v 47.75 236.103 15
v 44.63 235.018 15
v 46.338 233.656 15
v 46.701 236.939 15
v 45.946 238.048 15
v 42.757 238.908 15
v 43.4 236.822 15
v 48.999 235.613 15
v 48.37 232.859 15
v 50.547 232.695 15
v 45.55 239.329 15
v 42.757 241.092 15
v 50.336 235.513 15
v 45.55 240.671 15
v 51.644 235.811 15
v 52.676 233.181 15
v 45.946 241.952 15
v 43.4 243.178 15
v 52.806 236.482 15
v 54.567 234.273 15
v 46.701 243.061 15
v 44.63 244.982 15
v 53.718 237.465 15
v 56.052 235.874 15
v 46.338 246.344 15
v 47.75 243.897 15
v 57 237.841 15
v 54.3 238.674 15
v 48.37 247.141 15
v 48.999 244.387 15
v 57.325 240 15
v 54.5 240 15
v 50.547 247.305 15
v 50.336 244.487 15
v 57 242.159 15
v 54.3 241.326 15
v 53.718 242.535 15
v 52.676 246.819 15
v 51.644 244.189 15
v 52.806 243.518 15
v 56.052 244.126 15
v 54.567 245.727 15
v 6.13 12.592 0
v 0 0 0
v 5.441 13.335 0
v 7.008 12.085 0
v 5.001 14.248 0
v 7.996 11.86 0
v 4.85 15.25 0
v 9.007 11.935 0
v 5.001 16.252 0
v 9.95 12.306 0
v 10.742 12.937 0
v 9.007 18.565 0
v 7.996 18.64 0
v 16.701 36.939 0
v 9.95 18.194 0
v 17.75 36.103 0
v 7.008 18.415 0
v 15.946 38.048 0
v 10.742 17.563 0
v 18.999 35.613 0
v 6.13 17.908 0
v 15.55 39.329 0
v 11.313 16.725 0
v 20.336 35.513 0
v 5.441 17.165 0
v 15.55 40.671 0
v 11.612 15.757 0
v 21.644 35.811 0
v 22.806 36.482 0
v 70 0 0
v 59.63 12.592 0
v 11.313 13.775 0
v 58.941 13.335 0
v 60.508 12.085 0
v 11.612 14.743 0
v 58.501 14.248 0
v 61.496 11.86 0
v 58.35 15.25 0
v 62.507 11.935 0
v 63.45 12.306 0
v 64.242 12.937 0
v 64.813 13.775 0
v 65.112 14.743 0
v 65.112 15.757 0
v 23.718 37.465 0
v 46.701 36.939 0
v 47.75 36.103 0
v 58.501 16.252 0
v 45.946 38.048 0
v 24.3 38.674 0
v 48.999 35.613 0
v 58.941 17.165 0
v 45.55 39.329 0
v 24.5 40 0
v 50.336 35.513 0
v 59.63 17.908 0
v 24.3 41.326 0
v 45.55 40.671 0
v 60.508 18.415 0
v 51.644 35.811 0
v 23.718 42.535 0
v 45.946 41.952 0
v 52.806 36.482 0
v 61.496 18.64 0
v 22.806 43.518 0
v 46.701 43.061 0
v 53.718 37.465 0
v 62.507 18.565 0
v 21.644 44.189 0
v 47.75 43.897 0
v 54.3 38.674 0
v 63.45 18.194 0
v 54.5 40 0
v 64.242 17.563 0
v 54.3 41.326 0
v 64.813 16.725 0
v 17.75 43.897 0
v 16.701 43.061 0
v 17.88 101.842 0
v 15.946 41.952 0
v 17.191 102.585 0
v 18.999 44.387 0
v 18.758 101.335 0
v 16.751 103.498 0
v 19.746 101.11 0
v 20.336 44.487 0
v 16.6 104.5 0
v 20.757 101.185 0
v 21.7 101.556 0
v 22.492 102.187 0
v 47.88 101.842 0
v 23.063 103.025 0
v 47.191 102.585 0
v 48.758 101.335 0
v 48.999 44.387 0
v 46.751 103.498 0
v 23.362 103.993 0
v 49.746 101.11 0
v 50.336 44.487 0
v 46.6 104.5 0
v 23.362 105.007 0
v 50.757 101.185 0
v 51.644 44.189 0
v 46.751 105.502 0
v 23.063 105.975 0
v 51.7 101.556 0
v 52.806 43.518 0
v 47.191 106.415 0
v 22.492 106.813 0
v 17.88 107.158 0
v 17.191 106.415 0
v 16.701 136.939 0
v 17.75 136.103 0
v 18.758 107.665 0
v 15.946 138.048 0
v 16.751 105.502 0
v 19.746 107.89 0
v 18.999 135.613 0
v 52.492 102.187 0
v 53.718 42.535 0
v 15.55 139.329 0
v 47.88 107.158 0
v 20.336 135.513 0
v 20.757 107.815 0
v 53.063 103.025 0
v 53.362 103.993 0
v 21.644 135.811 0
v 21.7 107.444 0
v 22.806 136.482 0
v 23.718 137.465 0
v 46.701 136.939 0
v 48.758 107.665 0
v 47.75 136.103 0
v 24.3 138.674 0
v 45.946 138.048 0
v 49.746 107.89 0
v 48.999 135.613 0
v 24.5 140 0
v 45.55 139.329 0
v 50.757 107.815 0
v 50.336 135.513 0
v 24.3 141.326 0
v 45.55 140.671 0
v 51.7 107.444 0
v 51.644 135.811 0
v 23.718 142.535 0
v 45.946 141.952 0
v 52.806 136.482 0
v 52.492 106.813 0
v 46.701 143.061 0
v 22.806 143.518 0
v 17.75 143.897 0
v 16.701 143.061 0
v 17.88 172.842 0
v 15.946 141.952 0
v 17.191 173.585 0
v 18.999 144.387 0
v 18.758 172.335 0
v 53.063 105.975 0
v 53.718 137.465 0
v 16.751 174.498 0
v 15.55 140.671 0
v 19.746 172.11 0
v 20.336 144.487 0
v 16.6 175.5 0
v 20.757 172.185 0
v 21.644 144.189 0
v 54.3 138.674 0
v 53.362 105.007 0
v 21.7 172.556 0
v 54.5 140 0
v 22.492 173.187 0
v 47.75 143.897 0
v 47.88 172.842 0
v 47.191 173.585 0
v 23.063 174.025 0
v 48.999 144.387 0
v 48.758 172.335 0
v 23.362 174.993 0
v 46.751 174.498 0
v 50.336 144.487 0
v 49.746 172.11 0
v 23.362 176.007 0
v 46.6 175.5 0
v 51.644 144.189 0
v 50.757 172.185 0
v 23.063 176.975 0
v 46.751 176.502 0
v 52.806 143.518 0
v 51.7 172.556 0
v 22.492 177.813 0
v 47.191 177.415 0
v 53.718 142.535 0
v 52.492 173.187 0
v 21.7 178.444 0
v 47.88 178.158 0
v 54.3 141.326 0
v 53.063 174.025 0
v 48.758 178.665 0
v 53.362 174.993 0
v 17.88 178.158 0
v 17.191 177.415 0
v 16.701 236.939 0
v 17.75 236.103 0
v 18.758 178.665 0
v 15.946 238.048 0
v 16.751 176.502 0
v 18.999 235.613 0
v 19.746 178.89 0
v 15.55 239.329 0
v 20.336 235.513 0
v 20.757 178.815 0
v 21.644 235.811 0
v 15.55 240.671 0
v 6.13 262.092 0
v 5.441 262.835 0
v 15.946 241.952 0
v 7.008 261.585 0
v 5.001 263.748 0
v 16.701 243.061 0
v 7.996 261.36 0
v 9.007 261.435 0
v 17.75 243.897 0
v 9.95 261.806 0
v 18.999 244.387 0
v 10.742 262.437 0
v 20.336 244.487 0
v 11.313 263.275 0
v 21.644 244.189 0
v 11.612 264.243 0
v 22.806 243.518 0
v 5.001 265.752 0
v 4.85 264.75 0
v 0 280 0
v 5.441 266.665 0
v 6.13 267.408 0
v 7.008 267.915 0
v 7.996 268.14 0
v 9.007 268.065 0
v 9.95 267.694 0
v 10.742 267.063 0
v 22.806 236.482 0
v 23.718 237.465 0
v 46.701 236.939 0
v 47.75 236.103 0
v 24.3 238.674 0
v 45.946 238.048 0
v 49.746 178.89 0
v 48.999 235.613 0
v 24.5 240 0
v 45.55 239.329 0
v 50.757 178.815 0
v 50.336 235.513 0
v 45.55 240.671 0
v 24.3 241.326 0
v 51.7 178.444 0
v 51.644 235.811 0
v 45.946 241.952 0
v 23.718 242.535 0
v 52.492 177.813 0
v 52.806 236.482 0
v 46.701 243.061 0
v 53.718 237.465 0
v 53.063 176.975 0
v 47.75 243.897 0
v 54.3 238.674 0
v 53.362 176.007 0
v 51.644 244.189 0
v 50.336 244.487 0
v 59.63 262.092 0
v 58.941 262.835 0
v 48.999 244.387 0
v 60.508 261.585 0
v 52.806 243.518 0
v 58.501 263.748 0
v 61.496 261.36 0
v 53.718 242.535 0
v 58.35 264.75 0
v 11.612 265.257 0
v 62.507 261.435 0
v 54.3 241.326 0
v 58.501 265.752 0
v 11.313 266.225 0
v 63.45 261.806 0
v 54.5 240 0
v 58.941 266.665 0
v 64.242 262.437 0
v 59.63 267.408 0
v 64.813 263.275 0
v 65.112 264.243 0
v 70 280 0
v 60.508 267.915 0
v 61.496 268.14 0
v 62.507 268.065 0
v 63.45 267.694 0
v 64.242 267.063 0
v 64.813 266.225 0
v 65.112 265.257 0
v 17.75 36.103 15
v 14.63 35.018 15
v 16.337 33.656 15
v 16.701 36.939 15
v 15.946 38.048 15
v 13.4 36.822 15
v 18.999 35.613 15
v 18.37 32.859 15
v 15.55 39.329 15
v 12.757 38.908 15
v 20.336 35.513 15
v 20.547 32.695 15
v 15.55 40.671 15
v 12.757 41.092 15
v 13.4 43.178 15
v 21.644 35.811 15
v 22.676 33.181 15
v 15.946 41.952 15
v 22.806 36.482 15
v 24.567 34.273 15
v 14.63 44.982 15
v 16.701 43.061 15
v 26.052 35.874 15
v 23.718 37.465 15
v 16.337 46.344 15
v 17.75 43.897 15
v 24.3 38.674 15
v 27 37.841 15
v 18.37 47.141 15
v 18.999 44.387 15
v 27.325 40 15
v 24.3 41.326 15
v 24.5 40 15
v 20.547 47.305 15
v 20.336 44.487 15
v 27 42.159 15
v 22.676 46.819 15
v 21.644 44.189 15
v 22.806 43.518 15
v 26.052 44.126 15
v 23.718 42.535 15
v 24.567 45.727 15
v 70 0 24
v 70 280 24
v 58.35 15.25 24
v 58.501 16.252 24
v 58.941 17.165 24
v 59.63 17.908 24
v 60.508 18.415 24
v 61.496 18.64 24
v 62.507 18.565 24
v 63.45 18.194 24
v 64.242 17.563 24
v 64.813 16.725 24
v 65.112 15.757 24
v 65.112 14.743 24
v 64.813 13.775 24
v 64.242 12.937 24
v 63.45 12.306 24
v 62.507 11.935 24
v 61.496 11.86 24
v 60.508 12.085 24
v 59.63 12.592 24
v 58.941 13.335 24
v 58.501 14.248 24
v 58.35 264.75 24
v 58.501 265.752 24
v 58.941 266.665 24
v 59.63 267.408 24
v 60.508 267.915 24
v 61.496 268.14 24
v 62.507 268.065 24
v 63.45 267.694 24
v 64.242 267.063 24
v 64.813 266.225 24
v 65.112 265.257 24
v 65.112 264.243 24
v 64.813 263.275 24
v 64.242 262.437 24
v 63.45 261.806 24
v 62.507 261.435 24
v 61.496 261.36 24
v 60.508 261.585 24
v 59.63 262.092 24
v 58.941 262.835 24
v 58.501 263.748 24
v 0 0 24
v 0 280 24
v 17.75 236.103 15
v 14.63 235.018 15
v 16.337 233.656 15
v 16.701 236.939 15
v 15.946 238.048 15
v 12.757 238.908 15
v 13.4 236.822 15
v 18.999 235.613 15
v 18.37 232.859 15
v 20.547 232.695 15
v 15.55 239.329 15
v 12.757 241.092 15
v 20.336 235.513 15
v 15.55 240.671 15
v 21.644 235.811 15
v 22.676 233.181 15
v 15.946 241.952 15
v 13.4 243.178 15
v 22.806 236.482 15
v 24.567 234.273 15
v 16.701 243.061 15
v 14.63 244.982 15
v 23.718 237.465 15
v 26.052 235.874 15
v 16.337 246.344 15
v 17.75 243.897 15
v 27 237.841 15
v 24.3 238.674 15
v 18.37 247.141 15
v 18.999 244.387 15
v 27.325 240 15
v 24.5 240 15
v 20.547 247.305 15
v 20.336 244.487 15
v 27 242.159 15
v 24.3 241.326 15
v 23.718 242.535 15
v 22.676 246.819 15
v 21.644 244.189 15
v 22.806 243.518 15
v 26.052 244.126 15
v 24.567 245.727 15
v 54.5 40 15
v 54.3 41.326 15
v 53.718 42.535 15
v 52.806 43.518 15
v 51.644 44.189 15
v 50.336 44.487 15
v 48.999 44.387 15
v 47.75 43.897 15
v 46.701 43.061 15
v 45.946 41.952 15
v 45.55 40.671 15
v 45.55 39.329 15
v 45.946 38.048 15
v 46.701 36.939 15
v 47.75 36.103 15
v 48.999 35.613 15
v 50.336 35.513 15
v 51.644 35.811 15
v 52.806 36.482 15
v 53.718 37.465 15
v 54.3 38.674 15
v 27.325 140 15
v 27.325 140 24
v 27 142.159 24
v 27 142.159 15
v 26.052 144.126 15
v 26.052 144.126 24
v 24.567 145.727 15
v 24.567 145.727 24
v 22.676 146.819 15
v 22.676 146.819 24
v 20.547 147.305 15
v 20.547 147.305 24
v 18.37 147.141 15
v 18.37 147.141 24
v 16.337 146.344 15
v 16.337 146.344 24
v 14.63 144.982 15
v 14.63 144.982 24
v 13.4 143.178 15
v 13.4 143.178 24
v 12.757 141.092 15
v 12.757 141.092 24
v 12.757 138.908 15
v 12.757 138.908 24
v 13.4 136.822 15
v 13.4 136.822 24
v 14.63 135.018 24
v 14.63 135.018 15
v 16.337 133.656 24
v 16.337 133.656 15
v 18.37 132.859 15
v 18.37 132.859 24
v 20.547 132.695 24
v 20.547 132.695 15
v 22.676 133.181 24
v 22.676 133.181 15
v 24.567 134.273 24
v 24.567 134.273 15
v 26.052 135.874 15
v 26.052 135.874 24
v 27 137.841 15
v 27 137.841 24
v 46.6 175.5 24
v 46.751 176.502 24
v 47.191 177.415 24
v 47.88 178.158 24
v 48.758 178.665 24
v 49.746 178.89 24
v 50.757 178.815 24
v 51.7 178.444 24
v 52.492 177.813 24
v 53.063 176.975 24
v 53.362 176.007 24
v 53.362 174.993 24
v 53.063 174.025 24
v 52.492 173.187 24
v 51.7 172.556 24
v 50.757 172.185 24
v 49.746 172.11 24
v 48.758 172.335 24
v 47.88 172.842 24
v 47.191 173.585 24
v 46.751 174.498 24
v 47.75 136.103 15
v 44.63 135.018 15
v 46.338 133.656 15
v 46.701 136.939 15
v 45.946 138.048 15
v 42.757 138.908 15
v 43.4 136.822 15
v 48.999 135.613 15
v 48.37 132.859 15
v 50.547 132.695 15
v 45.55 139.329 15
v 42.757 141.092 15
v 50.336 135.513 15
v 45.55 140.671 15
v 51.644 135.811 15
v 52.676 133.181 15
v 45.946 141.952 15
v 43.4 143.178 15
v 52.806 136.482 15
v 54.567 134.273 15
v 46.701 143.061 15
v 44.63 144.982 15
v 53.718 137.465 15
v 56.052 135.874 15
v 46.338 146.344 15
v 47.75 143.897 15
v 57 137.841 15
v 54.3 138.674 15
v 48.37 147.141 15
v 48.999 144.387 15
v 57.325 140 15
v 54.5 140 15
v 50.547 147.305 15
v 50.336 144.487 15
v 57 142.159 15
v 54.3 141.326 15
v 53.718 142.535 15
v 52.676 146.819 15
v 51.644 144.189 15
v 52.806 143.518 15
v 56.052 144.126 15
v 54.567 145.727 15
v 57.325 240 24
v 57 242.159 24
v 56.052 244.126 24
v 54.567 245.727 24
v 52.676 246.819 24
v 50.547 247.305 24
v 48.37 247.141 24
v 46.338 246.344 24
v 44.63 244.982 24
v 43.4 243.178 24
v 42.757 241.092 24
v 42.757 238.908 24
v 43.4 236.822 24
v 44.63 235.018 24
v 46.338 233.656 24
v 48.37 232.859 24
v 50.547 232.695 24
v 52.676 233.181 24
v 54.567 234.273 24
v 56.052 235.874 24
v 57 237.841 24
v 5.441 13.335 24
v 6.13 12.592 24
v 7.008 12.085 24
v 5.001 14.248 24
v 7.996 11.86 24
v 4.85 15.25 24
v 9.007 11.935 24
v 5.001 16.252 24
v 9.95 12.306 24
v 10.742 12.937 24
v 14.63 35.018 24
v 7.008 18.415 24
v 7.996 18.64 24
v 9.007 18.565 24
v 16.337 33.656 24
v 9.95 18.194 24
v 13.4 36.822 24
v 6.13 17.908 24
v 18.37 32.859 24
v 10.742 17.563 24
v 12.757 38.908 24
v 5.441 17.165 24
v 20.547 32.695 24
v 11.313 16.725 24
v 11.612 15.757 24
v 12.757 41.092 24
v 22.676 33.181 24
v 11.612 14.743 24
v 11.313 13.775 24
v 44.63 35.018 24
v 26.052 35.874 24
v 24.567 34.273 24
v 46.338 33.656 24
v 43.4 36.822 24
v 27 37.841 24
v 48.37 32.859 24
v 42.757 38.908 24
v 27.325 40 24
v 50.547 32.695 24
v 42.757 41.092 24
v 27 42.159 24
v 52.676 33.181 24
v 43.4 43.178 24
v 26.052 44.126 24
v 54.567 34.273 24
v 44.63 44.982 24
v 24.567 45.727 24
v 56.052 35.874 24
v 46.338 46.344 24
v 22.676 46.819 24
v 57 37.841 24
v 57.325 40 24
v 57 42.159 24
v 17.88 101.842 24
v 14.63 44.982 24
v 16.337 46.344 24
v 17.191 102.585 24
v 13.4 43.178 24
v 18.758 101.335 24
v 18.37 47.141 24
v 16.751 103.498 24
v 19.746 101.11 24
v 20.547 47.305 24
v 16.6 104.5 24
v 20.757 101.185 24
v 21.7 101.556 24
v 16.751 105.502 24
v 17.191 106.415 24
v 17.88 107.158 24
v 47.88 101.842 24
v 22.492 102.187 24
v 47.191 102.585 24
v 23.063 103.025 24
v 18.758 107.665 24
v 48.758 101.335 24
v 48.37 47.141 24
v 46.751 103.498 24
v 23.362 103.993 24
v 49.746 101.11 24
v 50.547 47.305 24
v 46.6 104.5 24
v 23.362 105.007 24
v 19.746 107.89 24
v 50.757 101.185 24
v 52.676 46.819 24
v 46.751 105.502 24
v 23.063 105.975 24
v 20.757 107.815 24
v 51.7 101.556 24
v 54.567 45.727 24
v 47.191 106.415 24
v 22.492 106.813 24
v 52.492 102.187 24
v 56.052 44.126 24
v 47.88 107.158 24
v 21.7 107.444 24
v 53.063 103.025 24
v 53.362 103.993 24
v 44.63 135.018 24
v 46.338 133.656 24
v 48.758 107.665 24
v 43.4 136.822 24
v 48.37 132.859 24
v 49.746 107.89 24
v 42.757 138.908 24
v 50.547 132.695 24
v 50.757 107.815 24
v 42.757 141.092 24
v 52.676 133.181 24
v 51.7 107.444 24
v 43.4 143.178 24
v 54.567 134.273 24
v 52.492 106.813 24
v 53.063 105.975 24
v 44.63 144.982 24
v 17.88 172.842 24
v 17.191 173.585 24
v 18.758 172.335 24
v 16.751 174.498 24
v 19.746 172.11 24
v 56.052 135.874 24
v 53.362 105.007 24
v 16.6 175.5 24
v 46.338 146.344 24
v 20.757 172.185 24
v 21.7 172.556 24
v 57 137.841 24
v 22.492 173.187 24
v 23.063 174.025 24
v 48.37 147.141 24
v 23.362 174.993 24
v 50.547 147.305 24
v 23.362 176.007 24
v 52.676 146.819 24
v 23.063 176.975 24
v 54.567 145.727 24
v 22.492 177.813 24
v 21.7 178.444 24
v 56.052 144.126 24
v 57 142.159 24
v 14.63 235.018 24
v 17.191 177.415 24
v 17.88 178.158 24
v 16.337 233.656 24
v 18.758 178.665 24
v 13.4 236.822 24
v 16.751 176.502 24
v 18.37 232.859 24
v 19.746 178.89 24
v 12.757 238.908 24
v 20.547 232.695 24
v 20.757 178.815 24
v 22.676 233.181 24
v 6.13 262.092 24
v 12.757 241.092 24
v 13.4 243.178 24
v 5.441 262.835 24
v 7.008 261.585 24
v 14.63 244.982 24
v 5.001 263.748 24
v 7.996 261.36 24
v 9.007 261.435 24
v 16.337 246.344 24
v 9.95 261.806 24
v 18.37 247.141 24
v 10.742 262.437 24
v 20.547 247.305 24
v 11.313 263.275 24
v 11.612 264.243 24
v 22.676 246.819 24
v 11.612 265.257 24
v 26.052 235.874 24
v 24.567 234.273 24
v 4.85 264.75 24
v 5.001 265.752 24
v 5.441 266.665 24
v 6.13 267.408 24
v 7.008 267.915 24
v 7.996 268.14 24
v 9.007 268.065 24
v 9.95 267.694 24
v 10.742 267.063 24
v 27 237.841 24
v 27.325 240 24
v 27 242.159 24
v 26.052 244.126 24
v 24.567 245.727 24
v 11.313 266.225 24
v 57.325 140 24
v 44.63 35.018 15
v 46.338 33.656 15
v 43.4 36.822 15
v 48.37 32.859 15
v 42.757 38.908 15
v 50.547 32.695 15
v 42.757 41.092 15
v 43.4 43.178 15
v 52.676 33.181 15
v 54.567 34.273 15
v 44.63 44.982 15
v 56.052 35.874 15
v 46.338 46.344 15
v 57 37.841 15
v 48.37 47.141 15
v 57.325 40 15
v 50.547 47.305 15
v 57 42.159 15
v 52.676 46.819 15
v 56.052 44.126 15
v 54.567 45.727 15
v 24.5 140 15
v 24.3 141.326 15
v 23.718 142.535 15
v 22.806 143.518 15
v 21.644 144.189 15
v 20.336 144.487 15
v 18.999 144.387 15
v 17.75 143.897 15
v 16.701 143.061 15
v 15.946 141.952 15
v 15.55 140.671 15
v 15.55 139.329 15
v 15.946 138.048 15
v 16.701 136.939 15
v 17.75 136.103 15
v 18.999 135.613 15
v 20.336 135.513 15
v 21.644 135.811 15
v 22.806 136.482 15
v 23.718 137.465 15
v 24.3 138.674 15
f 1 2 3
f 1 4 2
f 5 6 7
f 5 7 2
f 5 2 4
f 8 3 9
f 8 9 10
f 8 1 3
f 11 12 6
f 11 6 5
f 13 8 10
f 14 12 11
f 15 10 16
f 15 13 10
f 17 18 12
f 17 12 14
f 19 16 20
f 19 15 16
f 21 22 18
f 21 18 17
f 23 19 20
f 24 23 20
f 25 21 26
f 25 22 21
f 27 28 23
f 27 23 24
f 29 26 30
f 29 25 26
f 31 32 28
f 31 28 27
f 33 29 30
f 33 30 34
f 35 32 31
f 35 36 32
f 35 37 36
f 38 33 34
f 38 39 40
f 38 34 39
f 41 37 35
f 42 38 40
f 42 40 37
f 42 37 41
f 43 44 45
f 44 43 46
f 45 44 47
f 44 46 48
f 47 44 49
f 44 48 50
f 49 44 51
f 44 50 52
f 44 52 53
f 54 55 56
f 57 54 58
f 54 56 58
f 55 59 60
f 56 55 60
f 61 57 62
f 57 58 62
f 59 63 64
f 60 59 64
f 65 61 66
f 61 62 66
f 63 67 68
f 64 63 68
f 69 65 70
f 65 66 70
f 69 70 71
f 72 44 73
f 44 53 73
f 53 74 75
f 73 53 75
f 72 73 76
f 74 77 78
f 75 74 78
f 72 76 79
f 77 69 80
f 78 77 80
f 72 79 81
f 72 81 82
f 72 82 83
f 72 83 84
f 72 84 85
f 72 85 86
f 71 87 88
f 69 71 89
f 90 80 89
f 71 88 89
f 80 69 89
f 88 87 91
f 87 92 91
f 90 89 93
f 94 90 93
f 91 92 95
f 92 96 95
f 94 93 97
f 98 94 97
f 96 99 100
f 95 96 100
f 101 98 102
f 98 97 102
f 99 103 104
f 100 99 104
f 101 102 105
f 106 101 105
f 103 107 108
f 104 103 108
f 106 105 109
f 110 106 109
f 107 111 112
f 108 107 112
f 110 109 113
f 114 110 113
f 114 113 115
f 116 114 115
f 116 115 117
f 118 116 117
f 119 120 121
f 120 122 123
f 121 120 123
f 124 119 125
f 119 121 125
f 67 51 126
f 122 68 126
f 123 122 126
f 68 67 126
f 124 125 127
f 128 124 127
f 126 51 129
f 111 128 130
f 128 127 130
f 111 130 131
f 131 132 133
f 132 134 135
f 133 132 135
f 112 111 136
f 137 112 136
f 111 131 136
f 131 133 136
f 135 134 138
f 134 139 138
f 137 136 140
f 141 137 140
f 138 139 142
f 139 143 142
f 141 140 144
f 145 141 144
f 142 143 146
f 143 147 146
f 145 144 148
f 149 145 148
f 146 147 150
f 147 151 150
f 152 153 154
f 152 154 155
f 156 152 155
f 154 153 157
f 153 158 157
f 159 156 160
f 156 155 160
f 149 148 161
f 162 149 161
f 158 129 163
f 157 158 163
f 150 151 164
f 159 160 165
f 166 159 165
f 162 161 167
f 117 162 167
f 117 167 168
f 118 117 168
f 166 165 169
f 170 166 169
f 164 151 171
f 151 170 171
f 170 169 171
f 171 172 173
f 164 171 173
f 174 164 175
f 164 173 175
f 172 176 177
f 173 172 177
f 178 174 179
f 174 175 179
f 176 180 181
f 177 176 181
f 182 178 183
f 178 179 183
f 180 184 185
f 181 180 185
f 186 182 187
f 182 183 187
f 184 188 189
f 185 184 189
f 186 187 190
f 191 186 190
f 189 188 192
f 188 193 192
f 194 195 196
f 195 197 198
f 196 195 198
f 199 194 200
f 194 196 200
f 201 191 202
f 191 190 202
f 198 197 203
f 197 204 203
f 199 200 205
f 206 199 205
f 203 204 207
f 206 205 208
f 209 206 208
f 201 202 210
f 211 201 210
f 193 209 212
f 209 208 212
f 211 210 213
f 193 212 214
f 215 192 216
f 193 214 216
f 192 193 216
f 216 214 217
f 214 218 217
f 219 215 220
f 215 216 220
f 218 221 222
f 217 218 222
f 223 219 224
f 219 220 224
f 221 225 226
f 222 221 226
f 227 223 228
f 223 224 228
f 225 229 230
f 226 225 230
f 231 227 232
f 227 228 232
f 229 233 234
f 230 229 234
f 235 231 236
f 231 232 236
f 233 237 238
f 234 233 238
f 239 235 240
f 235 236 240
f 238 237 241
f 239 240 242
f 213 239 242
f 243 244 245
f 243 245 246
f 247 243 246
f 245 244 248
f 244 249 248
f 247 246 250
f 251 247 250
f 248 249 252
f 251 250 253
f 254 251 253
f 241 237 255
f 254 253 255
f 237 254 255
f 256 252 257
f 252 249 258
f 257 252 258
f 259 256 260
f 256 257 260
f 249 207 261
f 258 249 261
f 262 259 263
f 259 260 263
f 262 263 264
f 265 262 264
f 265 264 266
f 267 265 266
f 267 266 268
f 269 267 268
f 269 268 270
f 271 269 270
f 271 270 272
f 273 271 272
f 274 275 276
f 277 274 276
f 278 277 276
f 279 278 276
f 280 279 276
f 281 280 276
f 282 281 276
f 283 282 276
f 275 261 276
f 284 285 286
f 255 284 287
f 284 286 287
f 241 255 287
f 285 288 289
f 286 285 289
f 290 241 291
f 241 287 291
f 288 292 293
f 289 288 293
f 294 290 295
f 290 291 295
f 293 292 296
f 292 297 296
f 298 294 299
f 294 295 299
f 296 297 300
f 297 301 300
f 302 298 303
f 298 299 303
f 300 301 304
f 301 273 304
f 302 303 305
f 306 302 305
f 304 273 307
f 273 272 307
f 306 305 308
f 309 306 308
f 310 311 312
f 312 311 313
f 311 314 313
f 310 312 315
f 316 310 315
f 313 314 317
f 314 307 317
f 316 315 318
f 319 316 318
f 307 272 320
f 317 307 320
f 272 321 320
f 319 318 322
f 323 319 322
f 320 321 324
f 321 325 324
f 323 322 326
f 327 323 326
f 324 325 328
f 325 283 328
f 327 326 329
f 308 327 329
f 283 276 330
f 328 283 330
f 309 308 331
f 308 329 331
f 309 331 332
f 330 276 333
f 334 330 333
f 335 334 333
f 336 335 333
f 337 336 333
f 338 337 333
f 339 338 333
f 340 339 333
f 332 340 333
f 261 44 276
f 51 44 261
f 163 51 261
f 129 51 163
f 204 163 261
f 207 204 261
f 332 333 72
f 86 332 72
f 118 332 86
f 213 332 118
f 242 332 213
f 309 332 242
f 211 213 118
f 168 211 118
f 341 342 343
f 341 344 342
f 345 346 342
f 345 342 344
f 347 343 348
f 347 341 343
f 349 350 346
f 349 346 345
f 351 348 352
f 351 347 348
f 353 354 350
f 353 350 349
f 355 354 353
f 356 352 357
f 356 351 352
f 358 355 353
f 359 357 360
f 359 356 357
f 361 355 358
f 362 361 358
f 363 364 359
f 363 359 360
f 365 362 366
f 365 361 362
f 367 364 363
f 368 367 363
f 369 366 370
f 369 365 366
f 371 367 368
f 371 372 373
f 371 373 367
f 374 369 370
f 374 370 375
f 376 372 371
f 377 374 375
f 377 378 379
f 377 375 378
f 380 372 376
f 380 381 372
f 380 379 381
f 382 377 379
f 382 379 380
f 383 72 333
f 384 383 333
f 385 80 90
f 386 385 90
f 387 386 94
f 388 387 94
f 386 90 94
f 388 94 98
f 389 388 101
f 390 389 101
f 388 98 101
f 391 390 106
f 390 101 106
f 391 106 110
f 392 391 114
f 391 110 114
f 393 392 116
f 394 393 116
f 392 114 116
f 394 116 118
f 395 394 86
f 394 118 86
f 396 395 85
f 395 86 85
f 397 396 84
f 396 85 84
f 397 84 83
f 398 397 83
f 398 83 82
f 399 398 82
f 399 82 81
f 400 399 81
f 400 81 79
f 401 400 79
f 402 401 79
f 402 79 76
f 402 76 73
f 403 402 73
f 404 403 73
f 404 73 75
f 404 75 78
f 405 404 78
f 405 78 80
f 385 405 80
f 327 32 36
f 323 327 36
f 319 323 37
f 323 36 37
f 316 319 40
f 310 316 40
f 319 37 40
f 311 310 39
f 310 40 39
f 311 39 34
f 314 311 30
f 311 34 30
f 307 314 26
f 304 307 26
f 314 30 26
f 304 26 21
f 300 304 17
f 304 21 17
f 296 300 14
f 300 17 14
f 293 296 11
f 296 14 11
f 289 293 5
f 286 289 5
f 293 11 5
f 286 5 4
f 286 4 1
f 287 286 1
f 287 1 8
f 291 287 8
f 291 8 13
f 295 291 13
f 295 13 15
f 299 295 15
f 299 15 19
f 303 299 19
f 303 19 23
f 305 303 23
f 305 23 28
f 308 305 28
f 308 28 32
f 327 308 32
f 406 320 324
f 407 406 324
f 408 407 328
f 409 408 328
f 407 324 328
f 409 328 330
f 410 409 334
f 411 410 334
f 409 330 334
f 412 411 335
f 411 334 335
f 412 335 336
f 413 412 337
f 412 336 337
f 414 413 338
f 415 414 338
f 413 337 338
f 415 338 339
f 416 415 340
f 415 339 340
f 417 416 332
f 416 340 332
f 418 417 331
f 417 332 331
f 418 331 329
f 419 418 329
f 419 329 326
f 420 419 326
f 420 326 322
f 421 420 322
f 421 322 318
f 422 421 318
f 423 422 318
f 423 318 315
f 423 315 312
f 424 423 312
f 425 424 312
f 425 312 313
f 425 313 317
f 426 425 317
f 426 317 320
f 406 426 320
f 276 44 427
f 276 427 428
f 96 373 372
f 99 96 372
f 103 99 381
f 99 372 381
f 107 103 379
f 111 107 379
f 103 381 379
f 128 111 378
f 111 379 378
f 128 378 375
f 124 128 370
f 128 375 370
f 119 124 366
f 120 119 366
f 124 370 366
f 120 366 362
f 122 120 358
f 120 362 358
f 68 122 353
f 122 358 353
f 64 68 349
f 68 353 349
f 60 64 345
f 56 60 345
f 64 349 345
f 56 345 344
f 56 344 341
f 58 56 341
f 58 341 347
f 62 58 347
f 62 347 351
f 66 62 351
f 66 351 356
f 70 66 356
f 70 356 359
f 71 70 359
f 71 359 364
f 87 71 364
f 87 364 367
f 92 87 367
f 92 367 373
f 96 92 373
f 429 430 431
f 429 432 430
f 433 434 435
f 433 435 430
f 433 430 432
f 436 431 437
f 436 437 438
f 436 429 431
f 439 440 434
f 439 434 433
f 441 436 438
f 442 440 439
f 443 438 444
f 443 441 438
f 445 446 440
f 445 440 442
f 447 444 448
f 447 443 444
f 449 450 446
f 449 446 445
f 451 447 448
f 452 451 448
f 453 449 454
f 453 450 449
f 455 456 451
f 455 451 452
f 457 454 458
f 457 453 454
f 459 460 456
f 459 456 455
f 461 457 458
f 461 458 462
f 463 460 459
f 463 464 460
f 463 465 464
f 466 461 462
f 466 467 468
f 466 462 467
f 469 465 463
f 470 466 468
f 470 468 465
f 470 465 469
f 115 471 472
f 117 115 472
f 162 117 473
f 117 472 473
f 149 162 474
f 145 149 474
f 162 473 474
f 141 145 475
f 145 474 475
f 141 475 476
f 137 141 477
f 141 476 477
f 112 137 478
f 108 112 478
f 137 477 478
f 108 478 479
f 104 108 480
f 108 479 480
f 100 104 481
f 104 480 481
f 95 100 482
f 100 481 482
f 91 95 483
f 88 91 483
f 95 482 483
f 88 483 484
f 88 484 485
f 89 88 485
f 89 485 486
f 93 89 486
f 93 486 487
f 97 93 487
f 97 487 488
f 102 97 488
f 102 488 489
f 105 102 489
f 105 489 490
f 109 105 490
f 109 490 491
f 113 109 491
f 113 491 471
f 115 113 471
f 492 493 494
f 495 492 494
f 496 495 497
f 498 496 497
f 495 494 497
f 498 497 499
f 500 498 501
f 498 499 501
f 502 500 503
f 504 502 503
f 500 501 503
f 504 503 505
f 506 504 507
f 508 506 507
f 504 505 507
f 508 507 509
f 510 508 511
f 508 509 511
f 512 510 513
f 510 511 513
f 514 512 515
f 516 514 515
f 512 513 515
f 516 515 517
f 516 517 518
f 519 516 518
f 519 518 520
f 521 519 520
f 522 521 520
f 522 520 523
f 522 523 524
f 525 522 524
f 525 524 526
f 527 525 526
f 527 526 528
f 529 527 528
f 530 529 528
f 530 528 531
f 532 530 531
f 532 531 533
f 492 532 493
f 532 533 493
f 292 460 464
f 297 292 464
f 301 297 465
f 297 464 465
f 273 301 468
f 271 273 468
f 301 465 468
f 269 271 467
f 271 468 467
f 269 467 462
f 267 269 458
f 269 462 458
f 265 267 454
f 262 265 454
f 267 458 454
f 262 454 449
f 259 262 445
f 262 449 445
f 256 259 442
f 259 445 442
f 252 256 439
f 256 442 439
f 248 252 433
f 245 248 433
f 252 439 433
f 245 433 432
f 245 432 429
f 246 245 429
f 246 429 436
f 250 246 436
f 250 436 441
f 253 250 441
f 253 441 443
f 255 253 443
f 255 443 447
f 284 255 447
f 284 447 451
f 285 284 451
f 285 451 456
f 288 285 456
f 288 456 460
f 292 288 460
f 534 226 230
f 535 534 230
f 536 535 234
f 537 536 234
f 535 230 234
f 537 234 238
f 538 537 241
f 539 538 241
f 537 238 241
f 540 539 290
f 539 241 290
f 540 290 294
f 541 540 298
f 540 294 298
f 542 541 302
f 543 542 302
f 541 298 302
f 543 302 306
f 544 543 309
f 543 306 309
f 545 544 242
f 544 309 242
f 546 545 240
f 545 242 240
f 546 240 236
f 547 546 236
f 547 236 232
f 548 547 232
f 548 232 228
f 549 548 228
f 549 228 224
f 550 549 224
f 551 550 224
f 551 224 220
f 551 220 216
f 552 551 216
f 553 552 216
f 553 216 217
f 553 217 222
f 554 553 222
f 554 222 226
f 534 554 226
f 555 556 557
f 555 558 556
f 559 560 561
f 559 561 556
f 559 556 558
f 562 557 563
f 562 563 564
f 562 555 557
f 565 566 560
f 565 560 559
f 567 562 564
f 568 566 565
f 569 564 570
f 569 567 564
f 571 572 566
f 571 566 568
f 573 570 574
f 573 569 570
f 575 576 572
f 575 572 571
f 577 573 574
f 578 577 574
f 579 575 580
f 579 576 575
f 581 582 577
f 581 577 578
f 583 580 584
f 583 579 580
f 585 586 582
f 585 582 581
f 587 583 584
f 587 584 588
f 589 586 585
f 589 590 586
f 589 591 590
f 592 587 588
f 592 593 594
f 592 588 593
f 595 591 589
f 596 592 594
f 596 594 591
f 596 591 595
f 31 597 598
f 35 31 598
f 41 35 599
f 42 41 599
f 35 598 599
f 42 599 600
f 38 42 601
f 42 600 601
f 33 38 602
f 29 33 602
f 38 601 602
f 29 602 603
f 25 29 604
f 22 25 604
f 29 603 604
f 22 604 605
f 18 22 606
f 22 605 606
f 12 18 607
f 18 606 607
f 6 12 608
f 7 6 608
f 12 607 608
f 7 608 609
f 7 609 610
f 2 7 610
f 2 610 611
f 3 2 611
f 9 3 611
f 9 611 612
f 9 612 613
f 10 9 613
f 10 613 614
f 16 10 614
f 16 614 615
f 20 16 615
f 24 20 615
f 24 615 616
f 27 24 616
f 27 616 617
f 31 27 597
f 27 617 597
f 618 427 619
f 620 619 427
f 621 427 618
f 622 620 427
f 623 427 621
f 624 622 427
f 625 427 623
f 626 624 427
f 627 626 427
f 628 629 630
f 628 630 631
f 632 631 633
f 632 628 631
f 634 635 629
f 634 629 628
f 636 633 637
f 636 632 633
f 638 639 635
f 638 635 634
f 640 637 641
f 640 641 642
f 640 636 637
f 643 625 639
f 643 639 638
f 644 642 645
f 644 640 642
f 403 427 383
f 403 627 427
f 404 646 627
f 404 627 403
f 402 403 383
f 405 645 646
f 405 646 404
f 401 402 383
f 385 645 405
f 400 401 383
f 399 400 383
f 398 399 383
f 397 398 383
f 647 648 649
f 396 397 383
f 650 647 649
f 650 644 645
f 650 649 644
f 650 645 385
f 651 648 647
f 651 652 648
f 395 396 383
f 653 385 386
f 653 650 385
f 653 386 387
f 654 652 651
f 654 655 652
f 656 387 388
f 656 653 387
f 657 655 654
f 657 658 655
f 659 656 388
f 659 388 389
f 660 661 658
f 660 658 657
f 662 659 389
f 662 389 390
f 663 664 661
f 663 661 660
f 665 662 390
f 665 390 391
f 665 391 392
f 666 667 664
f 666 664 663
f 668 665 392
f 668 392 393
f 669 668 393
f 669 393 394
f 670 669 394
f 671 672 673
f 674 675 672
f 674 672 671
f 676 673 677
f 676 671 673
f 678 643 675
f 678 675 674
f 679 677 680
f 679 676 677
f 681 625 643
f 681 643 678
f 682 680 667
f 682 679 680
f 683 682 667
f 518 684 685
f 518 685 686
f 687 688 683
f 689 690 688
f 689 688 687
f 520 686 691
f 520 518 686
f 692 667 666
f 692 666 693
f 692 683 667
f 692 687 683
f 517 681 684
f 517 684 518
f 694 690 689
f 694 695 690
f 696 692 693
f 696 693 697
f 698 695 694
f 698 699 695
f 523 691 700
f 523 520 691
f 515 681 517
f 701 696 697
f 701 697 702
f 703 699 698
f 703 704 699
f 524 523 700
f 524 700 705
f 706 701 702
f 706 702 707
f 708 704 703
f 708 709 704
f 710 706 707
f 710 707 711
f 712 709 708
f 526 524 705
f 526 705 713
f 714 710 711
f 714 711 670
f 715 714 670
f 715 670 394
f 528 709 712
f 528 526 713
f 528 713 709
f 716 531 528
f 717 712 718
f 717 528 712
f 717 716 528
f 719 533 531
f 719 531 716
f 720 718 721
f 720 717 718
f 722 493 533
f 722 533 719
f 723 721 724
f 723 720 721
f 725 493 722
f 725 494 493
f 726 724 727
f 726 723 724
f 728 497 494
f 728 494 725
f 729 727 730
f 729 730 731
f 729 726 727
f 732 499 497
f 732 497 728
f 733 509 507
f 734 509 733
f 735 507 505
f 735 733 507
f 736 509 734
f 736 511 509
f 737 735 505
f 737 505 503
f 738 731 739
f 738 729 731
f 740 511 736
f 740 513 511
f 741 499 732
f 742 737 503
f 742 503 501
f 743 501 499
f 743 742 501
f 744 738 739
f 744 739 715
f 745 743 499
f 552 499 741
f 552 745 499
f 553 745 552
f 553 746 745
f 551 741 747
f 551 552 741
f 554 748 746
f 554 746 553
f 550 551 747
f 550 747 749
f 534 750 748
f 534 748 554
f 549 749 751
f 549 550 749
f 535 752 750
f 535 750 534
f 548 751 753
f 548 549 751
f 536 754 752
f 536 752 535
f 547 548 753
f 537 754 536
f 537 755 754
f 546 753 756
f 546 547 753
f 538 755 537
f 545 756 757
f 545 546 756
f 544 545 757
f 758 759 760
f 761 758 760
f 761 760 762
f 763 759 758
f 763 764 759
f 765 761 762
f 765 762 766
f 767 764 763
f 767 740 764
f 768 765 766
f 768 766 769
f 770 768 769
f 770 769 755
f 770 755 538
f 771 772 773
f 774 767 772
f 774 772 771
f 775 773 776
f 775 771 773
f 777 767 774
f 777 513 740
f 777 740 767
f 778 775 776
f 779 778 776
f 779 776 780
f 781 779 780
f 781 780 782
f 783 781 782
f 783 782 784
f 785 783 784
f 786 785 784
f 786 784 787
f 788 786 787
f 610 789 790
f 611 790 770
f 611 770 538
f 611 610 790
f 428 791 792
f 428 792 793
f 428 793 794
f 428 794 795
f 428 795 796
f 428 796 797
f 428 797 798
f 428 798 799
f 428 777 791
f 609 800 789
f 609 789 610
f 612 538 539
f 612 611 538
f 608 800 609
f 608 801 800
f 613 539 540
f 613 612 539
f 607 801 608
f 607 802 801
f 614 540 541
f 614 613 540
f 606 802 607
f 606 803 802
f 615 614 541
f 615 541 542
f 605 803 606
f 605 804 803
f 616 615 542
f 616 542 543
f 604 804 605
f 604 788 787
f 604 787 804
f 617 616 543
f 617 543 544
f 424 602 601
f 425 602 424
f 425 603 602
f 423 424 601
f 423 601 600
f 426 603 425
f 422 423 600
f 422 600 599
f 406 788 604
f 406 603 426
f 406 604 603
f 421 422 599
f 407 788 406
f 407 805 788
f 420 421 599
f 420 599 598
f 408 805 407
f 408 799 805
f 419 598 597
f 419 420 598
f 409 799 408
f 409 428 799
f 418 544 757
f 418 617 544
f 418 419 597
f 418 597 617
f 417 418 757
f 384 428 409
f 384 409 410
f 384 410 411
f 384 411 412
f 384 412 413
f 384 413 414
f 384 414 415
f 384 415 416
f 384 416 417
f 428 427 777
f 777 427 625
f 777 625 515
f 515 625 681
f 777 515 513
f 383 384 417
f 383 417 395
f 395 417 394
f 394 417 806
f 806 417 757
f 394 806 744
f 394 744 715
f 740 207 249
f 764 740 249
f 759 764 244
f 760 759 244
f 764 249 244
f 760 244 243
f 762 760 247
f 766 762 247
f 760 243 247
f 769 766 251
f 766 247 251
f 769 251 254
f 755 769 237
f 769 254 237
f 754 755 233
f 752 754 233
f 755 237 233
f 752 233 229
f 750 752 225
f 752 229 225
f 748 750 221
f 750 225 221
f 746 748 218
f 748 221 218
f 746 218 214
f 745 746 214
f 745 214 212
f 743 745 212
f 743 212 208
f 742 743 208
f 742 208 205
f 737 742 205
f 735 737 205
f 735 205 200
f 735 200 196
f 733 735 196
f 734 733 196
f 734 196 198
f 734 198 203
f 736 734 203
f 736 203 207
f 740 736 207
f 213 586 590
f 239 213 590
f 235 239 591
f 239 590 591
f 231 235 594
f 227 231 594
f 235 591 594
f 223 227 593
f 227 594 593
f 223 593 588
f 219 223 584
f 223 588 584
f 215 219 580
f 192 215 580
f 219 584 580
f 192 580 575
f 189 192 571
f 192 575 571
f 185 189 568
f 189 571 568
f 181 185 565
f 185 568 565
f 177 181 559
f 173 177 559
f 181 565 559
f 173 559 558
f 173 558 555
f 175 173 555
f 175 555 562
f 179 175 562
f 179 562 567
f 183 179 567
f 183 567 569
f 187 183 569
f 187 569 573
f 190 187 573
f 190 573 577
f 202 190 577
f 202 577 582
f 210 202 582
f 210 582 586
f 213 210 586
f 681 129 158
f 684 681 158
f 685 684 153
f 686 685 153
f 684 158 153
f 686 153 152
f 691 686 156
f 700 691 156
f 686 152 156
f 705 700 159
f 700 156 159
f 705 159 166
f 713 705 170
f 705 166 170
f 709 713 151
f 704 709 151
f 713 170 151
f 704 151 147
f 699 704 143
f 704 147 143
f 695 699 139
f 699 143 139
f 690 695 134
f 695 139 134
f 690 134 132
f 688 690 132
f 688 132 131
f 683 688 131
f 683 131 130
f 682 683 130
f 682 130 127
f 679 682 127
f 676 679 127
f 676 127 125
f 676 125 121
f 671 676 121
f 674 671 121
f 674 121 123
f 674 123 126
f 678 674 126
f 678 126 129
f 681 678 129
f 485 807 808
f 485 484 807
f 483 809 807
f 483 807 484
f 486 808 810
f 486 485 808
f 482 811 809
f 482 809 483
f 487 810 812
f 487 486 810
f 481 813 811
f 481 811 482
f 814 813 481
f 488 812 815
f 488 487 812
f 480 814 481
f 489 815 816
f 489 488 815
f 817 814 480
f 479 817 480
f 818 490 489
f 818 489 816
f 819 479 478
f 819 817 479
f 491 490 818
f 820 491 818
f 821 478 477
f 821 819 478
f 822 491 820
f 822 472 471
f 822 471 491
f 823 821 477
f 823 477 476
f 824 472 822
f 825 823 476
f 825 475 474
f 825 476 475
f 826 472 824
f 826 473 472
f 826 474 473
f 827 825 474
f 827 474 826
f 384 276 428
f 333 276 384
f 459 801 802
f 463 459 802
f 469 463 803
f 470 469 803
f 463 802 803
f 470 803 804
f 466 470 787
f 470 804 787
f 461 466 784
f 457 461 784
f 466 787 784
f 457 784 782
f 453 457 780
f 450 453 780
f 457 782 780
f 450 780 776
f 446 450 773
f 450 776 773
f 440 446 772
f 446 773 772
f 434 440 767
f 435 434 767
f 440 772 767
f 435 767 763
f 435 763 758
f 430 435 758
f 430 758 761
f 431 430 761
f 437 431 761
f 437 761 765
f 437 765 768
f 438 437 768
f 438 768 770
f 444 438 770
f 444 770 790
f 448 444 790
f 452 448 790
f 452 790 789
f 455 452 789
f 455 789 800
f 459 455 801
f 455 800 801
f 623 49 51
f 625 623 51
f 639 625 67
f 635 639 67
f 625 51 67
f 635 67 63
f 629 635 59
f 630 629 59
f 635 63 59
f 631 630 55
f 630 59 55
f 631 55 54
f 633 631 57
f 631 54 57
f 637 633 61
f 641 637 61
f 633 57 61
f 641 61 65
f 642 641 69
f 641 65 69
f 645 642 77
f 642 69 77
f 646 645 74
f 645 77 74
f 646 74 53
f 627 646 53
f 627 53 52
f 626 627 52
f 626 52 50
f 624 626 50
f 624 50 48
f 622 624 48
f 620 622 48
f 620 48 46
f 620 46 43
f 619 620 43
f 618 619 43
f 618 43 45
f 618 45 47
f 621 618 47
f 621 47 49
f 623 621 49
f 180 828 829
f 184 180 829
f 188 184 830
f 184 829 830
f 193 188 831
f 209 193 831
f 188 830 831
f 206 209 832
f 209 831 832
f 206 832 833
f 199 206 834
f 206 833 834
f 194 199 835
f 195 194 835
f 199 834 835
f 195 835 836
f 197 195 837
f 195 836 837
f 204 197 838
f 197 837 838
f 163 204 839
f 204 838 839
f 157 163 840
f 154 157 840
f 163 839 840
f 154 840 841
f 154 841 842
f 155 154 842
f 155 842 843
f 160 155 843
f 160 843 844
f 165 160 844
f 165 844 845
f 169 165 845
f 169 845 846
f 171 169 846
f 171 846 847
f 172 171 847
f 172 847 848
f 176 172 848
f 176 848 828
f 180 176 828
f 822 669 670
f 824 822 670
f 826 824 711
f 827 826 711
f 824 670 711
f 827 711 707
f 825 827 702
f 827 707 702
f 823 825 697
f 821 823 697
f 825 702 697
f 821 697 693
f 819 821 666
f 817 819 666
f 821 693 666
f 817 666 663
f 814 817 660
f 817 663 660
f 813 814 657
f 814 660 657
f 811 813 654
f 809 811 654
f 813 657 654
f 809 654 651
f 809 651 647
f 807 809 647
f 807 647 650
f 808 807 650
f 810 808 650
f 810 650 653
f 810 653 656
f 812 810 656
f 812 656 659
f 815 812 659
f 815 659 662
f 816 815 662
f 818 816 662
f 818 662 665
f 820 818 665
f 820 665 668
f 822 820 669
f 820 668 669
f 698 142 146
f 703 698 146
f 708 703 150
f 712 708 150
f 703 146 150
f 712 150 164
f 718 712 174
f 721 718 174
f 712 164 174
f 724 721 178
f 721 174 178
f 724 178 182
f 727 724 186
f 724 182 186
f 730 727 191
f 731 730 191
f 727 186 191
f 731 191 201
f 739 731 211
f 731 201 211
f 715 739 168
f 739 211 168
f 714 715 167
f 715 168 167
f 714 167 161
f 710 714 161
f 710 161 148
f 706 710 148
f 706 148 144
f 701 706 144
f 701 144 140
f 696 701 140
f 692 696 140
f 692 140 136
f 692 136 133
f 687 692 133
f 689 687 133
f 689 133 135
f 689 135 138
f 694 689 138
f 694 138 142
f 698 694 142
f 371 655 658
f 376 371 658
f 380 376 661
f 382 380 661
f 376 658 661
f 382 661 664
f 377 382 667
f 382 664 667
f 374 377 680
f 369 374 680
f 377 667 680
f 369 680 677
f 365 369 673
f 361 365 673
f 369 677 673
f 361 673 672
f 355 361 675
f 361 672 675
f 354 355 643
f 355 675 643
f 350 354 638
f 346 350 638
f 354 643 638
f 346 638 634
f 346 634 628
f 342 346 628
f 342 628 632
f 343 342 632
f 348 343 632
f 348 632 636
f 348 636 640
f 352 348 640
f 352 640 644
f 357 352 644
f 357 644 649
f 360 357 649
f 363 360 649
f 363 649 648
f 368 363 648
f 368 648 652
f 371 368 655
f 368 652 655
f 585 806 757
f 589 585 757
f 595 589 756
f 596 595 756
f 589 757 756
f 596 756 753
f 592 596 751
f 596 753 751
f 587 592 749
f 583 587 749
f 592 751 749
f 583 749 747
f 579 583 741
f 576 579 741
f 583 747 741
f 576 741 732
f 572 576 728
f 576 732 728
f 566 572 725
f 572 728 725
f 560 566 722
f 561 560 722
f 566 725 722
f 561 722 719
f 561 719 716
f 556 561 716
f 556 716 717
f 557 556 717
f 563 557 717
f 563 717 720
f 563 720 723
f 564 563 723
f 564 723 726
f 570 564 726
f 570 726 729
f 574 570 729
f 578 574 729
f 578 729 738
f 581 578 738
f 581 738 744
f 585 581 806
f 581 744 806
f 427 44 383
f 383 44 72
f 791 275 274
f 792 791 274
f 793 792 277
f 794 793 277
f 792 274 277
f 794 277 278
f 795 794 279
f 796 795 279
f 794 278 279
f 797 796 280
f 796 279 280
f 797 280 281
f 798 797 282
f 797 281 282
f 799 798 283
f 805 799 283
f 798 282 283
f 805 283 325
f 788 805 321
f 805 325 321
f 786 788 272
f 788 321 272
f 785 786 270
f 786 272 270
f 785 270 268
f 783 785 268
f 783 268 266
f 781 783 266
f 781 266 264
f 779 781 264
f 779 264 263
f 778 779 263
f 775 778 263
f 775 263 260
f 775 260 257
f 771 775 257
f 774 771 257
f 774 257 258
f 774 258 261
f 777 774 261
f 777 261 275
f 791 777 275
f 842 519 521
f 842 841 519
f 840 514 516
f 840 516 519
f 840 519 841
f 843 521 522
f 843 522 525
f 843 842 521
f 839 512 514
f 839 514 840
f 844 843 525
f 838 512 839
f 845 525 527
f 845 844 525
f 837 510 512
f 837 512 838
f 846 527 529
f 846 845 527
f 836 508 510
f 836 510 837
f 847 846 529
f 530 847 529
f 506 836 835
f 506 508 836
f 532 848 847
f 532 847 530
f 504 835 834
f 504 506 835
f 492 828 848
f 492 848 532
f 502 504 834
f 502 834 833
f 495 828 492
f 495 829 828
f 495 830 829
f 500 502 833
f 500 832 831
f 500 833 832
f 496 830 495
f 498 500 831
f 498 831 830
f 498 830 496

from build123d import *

# Parameters (mm, degrees)
F0_W     = 70
F0_H     = 280
F1_DEPTH = 24
F2_R     = 7.325
F3_DEPTH = 9
F4_R     = 4.5
F5_DEPTH = 24.001
F7_D     = 6.8


with BuildPart() as f1:
    # F0 (on Top) → F1 (new body)
    with BuildSketch(Plane.XY):
        with Locations((35, 140)):
            Rectangle(F0_W, F0_H)
    extrude(amount=F1_DEPTH)

    # F2 (on face) → F3 (cut)
    with BuildSketch(Plane.XY.offset(24)):
        with Locations((20, 140)):
            Circle(F2_R)
        with Locations((50, 140)):
            Circle(F2_R)
        with Locations((20, 240)):
            Circle(F2_R)
        with Locations((50, 240)):
            Circle(F2_R)
        with Locations((20, 40)):
            Circle(F2_R)
        with Locations((50, 40)):
            Circle(F2_R)
    extrude(amount=-F3_DEPTH, mode=Mode.SUBTRACT)

    # F4 (on face) → F5 (cut, through all)
    with BuildSketch(Plane.XY.offset(24)):
        with Locations((20, 240)):
            Circle(F4_R)
        with Locations((50, 240)):
            Circle(F4_R)
        with Locations((20, 140)):
            Circle(F4_R)
        with Locations((50, 140)):
            Circle(F4_R)
        with Locations((20, 40)):
            Circle(F4_R)
        with Locations((50, 40)):
            Circle(F4_R)
    extrude(amount=-F5_DEPTH, mode=Mode.SUBTRACT)

    # F7 (through all)
    with Locations(Plane.XY.offset(24)):
        with Locations((8.25, 264.75), (61.75, 264.75), (20, 175.5), (50, 175.5), (20, 104.5), (50, 104.5), (8.25, 15.25), (61.75, 15.25)):
            Hole(F7_D / 2)


solid = f1.part
